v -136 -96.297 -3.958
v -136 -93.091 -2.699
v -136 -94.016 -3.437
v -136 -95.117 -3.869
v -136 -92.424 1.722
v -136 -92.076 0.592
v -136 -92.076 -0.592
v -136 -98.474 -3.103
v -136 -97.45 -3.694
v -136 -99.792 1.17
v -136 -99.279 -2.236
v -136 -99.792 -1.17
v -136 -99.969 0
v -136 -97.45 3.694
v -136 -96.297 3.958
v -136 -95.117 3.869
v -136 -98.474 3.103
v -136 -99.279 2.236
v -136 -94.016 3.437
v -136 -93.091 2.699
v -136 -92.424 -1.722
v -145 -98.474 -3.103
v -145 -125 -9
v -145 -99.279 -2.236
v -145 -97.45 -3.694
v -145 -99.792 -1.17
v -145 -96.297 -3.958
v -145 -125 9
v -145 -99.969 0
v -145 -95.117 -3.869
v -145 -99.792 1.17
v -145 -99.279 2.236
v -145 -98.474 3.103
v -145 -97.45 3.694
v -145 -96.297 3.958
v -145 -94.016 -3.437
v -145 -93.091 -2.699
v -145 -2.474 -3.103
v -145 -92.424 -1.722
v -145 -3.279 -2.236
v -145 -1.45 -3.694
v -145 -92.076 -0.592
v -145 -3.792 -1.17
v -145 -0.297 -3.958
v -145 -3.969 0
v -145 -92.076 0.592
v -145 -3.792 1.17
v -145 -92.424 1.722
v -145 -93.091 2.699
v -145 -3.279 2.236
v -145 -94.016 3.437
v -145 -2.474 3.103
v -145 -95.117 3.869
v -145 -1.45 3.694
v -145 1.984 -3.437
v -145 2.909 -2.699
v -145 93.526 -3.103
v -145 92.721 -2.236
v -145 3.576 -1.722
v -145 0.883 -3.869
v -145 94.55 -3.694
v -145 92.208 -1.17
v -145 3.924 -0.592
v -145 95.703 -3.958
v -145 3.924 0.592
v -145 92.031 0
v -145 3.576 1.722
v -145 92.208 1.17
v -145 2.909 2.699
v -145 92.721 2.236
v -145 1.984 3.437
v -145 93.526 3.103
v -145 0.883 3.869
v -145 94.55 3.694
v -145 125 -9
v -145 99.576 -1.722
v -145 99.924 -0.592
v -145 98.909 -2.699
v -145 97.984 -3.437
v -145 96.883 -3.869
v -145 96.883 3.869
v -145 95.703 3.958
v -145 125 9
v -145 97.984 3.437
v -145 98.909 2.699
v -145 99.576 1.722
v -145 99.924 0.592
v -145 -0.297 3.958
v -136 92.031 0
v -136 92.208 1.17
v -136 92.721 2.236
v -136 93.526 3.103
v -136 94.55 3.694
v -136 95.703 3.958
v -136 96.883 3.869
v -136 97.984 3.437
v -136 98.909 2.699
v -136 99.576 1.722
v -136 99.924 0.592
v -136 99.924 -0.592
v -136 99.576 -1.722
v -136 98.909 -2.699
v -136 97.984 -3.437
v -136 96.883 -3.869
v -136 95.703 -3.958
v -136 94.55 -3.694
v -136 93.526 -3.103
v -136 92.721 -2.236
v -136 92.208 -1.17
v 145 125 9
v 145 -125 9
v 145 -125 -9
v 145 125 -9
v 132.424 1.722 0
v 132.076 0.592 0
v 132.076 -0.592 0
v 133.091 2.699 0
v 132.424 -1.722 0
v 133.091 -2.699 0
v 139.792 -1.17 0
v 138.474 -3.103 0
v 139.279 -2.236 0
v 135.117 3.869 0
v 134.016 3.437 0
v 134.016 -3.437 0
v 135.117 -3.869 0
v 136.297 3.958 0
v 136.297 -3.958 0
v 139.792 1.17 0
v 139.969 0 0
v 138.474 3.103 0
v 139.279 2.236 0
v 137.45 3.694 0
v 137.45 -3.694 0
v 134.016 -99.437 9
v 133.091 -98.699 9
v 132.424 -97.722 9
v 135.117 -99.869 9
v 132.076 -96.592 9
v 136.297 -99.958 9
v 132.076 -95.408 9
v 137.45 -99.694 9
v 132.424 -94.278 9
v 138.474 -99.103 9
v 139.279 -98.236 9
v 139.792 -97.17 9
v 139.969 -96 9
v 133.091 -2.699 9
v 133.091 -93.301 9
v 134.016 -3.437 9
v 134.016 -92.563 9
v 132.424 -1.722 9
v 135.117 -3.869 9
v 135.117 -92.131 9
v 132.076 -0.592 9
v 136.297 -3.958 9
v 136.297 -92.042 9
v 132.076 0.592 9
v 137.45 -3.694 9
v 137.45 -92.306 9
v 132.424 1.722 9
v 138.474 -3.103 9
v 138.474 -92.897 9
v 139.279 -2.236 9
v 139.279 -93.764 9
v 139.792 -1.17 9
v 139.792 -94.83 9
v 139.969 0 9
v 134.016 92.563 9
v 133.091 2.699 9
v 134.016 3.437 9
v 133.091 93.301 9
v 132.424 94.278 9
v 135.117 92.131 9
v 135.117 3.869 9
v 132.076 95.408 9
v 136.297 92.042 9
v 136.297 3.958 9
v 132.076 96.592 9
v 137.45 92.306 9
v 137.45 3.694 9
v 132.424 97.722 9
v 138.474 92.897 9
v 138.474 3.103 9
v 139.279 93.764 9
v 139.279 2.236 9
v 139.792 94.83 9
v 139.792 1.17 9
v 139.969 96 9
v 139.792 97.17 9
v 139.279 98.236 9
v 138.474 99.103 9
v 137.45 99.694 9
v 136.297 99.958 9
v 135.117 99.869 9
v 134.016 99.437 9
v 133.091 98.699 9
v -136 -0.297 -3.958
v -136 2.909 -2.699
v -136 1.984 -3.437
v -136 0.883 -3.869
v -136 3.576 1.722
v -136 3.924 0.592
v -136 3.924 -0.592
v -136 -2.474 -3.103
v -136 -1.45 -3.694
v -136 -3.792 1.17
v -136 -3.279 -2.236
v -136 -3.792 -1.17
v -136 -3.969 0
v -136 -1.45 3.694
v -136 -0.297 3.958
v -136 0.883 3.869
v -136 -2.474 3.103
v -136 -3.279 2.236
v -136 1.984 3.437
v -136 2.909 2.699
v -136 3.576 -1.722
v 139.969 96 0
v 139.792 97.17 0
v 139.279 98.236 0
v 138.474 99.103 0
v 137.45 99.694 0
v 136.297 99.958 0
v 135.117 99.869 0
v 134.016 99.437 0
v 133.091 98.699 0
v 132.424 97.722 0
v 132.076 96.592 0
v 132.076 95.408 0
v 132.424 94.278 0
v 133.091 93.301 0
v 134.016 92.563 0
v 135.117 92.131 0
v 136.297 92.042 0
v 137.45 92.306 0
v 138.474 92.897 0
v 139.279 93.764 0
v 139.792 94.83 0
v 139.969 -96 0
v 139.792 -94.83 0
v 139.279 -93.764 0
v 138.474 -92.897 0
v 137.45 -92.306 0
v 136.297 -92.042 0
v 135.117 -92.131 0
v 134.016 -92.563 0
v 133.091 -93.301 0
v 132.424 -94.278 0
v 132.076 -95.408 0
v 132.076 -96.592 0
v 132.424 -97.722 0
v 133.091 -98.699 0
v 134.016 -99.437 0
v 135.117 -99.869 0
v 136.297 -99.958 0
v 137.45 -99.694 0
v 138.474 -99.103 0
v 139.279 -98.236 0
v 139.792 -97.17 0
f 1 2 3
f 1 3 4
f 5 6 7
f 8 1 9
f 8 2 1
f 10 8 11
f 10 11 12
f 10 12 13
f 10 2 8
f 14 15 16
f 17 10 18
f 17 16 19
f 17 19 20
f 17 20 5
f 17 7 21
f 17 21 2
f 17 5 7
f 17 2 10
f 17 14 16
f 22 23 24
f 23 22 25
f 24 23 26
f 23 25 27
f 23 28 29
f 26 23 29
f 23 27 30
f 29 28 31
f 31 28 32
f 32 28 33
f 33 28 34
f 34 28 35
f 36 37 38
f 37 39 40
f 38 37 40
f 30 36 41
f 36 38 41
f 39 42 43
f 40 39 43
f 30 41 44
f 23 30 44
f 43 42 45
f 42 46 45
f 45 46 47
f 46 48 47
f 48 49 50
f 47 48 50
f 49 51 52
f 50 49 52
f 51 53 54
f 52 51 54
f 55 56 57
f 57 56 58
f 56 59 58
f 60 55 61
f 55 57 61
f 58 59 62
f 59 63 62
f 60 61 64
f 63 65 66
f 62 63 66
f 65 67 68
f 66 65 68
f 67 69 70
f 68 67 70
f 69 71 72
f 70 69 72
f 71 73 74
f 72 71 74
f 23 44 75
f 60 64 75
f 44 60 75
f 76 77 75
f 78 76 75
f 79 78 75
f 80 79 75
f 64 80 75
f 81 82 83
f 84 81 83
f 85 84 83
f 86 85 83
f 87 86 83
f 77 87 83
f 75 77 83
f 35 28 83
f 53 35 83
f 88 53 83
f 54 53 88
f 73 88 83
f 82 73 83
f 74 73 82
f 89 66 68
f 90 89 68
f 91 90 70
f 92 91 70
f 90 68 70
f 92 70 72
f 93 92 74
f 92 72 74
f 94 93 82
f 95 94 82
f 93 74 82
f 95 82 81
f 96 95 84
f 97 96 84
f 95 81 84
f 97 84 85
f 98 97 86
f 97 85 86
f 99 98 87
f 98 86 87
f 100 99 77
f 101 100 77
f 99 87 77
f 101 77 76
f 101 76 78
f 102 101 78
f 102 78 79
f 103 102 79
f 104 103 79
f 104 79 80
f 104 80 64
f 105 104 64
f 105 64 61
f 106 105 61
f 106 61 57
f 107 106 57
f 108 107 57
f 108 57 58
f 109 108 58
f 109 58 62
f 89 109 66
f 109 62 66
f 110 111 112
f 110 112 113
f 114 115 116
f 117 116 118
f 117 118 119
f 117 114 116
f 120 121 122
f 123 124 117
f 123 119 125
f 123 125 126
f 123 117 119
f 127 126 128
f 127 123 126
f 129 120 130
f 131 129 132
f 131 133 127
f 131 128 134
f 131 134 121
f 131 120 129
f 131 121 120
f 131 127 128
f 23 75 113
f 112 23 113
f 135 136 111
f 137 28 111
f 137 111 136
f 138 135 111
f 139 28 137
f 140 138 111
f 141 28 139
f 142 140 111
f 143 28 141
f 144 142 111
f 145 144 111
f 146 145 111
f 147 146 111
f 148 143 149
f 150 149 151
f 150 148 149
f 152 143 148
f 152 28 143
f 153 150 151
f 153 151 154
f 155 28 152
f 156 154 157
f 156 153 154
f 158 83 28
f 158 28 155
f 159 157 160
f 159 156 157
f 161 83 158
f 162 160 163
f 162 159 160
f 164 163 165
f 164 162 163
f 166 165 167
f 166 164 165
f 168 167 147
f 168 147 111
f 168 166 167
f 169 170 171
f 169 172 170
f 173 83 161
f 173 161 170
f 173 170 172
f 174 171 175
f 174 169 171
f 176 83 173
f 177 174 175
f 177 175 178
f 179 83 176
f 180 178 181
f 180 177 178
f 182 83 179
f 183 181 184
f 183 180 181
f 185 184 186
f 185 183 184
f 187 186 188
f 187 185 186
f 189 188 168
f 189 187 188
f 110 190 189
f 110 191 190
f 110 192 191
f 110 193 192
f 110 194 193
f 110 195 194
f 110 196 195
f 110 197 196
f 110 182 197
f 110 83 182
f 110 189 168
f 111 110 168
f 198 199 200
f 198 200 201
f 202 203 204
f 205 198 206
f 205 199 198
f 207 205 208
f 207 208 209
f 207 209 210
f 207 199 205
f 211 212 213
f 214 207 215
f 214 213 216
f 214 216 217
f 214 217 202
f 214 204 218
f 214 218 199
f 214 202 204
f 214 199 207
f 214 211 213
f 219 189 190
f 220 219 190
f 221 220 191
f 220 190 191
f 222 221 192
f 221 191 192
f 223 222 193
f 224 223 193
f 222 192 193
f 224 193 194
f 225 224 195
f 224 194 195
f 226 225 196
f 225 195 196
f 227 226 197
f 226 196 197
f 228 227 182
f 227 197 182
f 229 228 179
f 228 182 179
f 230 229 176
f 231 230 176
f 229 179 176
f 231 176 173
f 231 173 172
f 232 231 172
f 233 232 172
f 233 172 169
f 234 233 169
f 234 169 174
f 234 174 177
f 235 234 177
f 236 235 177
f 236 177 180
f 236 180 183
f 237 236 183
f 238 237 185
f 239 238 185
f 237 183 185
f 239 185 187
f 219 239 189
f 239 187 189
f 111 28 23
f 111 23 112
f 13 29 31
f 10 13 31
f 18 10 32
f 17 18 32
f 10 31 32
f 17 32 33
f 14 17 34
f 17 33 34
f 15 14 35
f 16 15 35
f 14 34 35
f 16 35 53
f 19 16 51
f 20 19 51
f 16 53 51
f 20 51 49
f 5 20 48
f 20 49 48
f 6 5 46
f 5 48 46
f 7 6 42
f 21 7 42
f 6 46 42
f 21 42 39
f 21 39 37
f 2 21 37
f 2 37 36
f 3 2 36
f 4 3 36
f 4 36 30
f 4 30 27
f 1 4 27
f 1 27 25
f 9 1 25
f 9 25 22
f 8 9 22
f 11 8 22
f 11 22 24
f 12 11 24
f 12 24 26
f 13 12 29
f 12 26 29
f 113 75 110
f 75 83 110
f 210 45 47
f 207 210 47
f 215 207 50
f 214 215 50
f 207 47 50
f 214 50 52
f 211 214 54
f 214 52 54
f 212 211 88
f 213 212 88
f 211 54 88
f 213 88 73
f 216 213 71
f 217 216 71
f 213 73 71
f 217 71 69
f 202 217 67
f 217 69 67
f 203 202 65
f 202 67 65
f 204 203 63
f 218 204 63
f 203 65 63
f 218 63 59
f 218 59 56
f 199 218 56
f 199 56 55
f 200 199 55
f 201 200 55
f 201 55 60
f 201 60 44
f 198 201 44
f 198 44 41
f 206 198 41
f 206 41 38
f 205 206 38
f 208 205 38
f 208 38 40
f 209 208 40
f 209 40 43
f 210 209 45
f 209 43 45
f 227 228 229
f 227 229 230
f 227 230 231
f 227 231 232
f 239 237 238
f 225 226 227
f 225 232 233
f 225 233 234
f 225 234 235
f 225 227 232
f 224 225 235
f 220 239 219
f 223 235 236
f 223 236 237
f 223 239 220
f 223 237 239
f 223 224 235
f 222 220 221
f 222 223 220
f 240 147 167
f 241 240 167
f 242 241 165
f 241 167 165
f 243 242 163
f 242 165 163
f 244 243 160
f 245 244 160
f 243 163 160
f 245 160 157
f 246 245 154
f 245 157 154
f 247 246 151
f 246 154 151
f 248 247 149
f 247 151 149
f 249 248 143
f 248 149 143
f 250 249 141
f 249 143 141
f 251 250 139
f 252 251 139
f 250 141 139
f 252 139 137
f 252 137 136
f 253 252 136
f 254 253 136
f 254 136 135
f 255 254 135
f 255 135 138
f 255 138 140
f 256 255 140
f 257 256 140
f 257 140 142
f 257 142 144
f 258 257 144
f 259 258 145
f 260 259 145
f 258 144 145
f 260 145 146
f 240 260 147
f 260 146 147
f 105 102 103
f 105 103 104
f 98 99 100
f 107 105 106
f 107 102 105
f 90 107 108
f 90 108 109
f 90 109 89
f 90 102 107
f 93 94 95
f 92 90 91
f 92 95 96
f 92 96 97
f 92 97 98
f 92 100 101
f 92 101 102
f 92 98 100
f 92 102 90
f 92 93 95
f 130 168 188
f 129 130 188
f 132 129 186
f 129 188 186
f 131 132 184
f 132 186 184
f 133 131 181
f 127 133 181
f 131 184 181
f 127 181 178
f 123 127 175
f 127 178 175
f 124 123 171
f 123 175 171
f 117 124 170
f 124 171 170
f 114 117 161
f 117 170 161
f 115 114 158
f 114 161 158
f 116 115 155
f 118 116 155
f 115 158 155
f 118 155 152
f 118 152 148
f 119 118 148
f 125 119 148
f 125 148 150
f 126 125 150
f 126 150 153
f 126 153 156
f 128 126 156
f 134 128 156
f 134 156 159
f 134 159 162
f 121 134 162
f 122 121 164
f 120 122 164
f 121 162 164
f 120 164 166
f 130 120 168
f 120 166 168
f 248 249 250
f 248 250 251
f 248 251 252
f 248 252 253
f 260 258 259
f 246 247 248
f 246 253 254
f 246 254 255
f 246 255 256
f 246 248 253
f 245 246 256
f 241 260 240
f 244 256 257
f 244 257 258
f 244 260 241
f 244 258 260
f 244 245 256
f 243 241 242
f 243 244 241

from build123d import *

# Parameters (mm, degrees)
F0_W     = 290
F0_H     = 250
F1_DEPTH = 9
F2_R     = 3.96875
F3_DEPTH = 9
F4_R     = 3.96875
F5_DEPTH = 9


with BuildPart() as f1:
    # F0 (on Top) → F1 (new body, symmetric)
    with BuildSketch(Plane.XY):
        Rectangle(F0_W, F0_H)
    extrude(amount=F1_DEPTH, both=True)

    # F2 (on face) → F3 (cut)
    with BuildSketch(Plane.XY.offset(9)):
        with Locations((136, 0)):
            Circle(F2_R)
        with Locations((136, 96)):
            Circle(F2_R)
        with Locations((136, -96)):
            Circle(F2_R)
    extrude(amount=-F3_DEPTH, mode=Mode.SUBTRACT)

    # F4 (on face) → F5 (cut)
    with BuildSketch(Plane(origin=(-145, 0, 0), x_dir=(0, -1, 0), z_dir=(-1, 0, 0))):
        Circle(F4_R)
        with Locations((96, 0)):
            Circle(F4_R)
        with Locations((-96, 0)):
            Circle(F4_R)
    extrude(amount=-F5_DEPTH, mode=Mode.SUBTRACT)


solid = f1.part
